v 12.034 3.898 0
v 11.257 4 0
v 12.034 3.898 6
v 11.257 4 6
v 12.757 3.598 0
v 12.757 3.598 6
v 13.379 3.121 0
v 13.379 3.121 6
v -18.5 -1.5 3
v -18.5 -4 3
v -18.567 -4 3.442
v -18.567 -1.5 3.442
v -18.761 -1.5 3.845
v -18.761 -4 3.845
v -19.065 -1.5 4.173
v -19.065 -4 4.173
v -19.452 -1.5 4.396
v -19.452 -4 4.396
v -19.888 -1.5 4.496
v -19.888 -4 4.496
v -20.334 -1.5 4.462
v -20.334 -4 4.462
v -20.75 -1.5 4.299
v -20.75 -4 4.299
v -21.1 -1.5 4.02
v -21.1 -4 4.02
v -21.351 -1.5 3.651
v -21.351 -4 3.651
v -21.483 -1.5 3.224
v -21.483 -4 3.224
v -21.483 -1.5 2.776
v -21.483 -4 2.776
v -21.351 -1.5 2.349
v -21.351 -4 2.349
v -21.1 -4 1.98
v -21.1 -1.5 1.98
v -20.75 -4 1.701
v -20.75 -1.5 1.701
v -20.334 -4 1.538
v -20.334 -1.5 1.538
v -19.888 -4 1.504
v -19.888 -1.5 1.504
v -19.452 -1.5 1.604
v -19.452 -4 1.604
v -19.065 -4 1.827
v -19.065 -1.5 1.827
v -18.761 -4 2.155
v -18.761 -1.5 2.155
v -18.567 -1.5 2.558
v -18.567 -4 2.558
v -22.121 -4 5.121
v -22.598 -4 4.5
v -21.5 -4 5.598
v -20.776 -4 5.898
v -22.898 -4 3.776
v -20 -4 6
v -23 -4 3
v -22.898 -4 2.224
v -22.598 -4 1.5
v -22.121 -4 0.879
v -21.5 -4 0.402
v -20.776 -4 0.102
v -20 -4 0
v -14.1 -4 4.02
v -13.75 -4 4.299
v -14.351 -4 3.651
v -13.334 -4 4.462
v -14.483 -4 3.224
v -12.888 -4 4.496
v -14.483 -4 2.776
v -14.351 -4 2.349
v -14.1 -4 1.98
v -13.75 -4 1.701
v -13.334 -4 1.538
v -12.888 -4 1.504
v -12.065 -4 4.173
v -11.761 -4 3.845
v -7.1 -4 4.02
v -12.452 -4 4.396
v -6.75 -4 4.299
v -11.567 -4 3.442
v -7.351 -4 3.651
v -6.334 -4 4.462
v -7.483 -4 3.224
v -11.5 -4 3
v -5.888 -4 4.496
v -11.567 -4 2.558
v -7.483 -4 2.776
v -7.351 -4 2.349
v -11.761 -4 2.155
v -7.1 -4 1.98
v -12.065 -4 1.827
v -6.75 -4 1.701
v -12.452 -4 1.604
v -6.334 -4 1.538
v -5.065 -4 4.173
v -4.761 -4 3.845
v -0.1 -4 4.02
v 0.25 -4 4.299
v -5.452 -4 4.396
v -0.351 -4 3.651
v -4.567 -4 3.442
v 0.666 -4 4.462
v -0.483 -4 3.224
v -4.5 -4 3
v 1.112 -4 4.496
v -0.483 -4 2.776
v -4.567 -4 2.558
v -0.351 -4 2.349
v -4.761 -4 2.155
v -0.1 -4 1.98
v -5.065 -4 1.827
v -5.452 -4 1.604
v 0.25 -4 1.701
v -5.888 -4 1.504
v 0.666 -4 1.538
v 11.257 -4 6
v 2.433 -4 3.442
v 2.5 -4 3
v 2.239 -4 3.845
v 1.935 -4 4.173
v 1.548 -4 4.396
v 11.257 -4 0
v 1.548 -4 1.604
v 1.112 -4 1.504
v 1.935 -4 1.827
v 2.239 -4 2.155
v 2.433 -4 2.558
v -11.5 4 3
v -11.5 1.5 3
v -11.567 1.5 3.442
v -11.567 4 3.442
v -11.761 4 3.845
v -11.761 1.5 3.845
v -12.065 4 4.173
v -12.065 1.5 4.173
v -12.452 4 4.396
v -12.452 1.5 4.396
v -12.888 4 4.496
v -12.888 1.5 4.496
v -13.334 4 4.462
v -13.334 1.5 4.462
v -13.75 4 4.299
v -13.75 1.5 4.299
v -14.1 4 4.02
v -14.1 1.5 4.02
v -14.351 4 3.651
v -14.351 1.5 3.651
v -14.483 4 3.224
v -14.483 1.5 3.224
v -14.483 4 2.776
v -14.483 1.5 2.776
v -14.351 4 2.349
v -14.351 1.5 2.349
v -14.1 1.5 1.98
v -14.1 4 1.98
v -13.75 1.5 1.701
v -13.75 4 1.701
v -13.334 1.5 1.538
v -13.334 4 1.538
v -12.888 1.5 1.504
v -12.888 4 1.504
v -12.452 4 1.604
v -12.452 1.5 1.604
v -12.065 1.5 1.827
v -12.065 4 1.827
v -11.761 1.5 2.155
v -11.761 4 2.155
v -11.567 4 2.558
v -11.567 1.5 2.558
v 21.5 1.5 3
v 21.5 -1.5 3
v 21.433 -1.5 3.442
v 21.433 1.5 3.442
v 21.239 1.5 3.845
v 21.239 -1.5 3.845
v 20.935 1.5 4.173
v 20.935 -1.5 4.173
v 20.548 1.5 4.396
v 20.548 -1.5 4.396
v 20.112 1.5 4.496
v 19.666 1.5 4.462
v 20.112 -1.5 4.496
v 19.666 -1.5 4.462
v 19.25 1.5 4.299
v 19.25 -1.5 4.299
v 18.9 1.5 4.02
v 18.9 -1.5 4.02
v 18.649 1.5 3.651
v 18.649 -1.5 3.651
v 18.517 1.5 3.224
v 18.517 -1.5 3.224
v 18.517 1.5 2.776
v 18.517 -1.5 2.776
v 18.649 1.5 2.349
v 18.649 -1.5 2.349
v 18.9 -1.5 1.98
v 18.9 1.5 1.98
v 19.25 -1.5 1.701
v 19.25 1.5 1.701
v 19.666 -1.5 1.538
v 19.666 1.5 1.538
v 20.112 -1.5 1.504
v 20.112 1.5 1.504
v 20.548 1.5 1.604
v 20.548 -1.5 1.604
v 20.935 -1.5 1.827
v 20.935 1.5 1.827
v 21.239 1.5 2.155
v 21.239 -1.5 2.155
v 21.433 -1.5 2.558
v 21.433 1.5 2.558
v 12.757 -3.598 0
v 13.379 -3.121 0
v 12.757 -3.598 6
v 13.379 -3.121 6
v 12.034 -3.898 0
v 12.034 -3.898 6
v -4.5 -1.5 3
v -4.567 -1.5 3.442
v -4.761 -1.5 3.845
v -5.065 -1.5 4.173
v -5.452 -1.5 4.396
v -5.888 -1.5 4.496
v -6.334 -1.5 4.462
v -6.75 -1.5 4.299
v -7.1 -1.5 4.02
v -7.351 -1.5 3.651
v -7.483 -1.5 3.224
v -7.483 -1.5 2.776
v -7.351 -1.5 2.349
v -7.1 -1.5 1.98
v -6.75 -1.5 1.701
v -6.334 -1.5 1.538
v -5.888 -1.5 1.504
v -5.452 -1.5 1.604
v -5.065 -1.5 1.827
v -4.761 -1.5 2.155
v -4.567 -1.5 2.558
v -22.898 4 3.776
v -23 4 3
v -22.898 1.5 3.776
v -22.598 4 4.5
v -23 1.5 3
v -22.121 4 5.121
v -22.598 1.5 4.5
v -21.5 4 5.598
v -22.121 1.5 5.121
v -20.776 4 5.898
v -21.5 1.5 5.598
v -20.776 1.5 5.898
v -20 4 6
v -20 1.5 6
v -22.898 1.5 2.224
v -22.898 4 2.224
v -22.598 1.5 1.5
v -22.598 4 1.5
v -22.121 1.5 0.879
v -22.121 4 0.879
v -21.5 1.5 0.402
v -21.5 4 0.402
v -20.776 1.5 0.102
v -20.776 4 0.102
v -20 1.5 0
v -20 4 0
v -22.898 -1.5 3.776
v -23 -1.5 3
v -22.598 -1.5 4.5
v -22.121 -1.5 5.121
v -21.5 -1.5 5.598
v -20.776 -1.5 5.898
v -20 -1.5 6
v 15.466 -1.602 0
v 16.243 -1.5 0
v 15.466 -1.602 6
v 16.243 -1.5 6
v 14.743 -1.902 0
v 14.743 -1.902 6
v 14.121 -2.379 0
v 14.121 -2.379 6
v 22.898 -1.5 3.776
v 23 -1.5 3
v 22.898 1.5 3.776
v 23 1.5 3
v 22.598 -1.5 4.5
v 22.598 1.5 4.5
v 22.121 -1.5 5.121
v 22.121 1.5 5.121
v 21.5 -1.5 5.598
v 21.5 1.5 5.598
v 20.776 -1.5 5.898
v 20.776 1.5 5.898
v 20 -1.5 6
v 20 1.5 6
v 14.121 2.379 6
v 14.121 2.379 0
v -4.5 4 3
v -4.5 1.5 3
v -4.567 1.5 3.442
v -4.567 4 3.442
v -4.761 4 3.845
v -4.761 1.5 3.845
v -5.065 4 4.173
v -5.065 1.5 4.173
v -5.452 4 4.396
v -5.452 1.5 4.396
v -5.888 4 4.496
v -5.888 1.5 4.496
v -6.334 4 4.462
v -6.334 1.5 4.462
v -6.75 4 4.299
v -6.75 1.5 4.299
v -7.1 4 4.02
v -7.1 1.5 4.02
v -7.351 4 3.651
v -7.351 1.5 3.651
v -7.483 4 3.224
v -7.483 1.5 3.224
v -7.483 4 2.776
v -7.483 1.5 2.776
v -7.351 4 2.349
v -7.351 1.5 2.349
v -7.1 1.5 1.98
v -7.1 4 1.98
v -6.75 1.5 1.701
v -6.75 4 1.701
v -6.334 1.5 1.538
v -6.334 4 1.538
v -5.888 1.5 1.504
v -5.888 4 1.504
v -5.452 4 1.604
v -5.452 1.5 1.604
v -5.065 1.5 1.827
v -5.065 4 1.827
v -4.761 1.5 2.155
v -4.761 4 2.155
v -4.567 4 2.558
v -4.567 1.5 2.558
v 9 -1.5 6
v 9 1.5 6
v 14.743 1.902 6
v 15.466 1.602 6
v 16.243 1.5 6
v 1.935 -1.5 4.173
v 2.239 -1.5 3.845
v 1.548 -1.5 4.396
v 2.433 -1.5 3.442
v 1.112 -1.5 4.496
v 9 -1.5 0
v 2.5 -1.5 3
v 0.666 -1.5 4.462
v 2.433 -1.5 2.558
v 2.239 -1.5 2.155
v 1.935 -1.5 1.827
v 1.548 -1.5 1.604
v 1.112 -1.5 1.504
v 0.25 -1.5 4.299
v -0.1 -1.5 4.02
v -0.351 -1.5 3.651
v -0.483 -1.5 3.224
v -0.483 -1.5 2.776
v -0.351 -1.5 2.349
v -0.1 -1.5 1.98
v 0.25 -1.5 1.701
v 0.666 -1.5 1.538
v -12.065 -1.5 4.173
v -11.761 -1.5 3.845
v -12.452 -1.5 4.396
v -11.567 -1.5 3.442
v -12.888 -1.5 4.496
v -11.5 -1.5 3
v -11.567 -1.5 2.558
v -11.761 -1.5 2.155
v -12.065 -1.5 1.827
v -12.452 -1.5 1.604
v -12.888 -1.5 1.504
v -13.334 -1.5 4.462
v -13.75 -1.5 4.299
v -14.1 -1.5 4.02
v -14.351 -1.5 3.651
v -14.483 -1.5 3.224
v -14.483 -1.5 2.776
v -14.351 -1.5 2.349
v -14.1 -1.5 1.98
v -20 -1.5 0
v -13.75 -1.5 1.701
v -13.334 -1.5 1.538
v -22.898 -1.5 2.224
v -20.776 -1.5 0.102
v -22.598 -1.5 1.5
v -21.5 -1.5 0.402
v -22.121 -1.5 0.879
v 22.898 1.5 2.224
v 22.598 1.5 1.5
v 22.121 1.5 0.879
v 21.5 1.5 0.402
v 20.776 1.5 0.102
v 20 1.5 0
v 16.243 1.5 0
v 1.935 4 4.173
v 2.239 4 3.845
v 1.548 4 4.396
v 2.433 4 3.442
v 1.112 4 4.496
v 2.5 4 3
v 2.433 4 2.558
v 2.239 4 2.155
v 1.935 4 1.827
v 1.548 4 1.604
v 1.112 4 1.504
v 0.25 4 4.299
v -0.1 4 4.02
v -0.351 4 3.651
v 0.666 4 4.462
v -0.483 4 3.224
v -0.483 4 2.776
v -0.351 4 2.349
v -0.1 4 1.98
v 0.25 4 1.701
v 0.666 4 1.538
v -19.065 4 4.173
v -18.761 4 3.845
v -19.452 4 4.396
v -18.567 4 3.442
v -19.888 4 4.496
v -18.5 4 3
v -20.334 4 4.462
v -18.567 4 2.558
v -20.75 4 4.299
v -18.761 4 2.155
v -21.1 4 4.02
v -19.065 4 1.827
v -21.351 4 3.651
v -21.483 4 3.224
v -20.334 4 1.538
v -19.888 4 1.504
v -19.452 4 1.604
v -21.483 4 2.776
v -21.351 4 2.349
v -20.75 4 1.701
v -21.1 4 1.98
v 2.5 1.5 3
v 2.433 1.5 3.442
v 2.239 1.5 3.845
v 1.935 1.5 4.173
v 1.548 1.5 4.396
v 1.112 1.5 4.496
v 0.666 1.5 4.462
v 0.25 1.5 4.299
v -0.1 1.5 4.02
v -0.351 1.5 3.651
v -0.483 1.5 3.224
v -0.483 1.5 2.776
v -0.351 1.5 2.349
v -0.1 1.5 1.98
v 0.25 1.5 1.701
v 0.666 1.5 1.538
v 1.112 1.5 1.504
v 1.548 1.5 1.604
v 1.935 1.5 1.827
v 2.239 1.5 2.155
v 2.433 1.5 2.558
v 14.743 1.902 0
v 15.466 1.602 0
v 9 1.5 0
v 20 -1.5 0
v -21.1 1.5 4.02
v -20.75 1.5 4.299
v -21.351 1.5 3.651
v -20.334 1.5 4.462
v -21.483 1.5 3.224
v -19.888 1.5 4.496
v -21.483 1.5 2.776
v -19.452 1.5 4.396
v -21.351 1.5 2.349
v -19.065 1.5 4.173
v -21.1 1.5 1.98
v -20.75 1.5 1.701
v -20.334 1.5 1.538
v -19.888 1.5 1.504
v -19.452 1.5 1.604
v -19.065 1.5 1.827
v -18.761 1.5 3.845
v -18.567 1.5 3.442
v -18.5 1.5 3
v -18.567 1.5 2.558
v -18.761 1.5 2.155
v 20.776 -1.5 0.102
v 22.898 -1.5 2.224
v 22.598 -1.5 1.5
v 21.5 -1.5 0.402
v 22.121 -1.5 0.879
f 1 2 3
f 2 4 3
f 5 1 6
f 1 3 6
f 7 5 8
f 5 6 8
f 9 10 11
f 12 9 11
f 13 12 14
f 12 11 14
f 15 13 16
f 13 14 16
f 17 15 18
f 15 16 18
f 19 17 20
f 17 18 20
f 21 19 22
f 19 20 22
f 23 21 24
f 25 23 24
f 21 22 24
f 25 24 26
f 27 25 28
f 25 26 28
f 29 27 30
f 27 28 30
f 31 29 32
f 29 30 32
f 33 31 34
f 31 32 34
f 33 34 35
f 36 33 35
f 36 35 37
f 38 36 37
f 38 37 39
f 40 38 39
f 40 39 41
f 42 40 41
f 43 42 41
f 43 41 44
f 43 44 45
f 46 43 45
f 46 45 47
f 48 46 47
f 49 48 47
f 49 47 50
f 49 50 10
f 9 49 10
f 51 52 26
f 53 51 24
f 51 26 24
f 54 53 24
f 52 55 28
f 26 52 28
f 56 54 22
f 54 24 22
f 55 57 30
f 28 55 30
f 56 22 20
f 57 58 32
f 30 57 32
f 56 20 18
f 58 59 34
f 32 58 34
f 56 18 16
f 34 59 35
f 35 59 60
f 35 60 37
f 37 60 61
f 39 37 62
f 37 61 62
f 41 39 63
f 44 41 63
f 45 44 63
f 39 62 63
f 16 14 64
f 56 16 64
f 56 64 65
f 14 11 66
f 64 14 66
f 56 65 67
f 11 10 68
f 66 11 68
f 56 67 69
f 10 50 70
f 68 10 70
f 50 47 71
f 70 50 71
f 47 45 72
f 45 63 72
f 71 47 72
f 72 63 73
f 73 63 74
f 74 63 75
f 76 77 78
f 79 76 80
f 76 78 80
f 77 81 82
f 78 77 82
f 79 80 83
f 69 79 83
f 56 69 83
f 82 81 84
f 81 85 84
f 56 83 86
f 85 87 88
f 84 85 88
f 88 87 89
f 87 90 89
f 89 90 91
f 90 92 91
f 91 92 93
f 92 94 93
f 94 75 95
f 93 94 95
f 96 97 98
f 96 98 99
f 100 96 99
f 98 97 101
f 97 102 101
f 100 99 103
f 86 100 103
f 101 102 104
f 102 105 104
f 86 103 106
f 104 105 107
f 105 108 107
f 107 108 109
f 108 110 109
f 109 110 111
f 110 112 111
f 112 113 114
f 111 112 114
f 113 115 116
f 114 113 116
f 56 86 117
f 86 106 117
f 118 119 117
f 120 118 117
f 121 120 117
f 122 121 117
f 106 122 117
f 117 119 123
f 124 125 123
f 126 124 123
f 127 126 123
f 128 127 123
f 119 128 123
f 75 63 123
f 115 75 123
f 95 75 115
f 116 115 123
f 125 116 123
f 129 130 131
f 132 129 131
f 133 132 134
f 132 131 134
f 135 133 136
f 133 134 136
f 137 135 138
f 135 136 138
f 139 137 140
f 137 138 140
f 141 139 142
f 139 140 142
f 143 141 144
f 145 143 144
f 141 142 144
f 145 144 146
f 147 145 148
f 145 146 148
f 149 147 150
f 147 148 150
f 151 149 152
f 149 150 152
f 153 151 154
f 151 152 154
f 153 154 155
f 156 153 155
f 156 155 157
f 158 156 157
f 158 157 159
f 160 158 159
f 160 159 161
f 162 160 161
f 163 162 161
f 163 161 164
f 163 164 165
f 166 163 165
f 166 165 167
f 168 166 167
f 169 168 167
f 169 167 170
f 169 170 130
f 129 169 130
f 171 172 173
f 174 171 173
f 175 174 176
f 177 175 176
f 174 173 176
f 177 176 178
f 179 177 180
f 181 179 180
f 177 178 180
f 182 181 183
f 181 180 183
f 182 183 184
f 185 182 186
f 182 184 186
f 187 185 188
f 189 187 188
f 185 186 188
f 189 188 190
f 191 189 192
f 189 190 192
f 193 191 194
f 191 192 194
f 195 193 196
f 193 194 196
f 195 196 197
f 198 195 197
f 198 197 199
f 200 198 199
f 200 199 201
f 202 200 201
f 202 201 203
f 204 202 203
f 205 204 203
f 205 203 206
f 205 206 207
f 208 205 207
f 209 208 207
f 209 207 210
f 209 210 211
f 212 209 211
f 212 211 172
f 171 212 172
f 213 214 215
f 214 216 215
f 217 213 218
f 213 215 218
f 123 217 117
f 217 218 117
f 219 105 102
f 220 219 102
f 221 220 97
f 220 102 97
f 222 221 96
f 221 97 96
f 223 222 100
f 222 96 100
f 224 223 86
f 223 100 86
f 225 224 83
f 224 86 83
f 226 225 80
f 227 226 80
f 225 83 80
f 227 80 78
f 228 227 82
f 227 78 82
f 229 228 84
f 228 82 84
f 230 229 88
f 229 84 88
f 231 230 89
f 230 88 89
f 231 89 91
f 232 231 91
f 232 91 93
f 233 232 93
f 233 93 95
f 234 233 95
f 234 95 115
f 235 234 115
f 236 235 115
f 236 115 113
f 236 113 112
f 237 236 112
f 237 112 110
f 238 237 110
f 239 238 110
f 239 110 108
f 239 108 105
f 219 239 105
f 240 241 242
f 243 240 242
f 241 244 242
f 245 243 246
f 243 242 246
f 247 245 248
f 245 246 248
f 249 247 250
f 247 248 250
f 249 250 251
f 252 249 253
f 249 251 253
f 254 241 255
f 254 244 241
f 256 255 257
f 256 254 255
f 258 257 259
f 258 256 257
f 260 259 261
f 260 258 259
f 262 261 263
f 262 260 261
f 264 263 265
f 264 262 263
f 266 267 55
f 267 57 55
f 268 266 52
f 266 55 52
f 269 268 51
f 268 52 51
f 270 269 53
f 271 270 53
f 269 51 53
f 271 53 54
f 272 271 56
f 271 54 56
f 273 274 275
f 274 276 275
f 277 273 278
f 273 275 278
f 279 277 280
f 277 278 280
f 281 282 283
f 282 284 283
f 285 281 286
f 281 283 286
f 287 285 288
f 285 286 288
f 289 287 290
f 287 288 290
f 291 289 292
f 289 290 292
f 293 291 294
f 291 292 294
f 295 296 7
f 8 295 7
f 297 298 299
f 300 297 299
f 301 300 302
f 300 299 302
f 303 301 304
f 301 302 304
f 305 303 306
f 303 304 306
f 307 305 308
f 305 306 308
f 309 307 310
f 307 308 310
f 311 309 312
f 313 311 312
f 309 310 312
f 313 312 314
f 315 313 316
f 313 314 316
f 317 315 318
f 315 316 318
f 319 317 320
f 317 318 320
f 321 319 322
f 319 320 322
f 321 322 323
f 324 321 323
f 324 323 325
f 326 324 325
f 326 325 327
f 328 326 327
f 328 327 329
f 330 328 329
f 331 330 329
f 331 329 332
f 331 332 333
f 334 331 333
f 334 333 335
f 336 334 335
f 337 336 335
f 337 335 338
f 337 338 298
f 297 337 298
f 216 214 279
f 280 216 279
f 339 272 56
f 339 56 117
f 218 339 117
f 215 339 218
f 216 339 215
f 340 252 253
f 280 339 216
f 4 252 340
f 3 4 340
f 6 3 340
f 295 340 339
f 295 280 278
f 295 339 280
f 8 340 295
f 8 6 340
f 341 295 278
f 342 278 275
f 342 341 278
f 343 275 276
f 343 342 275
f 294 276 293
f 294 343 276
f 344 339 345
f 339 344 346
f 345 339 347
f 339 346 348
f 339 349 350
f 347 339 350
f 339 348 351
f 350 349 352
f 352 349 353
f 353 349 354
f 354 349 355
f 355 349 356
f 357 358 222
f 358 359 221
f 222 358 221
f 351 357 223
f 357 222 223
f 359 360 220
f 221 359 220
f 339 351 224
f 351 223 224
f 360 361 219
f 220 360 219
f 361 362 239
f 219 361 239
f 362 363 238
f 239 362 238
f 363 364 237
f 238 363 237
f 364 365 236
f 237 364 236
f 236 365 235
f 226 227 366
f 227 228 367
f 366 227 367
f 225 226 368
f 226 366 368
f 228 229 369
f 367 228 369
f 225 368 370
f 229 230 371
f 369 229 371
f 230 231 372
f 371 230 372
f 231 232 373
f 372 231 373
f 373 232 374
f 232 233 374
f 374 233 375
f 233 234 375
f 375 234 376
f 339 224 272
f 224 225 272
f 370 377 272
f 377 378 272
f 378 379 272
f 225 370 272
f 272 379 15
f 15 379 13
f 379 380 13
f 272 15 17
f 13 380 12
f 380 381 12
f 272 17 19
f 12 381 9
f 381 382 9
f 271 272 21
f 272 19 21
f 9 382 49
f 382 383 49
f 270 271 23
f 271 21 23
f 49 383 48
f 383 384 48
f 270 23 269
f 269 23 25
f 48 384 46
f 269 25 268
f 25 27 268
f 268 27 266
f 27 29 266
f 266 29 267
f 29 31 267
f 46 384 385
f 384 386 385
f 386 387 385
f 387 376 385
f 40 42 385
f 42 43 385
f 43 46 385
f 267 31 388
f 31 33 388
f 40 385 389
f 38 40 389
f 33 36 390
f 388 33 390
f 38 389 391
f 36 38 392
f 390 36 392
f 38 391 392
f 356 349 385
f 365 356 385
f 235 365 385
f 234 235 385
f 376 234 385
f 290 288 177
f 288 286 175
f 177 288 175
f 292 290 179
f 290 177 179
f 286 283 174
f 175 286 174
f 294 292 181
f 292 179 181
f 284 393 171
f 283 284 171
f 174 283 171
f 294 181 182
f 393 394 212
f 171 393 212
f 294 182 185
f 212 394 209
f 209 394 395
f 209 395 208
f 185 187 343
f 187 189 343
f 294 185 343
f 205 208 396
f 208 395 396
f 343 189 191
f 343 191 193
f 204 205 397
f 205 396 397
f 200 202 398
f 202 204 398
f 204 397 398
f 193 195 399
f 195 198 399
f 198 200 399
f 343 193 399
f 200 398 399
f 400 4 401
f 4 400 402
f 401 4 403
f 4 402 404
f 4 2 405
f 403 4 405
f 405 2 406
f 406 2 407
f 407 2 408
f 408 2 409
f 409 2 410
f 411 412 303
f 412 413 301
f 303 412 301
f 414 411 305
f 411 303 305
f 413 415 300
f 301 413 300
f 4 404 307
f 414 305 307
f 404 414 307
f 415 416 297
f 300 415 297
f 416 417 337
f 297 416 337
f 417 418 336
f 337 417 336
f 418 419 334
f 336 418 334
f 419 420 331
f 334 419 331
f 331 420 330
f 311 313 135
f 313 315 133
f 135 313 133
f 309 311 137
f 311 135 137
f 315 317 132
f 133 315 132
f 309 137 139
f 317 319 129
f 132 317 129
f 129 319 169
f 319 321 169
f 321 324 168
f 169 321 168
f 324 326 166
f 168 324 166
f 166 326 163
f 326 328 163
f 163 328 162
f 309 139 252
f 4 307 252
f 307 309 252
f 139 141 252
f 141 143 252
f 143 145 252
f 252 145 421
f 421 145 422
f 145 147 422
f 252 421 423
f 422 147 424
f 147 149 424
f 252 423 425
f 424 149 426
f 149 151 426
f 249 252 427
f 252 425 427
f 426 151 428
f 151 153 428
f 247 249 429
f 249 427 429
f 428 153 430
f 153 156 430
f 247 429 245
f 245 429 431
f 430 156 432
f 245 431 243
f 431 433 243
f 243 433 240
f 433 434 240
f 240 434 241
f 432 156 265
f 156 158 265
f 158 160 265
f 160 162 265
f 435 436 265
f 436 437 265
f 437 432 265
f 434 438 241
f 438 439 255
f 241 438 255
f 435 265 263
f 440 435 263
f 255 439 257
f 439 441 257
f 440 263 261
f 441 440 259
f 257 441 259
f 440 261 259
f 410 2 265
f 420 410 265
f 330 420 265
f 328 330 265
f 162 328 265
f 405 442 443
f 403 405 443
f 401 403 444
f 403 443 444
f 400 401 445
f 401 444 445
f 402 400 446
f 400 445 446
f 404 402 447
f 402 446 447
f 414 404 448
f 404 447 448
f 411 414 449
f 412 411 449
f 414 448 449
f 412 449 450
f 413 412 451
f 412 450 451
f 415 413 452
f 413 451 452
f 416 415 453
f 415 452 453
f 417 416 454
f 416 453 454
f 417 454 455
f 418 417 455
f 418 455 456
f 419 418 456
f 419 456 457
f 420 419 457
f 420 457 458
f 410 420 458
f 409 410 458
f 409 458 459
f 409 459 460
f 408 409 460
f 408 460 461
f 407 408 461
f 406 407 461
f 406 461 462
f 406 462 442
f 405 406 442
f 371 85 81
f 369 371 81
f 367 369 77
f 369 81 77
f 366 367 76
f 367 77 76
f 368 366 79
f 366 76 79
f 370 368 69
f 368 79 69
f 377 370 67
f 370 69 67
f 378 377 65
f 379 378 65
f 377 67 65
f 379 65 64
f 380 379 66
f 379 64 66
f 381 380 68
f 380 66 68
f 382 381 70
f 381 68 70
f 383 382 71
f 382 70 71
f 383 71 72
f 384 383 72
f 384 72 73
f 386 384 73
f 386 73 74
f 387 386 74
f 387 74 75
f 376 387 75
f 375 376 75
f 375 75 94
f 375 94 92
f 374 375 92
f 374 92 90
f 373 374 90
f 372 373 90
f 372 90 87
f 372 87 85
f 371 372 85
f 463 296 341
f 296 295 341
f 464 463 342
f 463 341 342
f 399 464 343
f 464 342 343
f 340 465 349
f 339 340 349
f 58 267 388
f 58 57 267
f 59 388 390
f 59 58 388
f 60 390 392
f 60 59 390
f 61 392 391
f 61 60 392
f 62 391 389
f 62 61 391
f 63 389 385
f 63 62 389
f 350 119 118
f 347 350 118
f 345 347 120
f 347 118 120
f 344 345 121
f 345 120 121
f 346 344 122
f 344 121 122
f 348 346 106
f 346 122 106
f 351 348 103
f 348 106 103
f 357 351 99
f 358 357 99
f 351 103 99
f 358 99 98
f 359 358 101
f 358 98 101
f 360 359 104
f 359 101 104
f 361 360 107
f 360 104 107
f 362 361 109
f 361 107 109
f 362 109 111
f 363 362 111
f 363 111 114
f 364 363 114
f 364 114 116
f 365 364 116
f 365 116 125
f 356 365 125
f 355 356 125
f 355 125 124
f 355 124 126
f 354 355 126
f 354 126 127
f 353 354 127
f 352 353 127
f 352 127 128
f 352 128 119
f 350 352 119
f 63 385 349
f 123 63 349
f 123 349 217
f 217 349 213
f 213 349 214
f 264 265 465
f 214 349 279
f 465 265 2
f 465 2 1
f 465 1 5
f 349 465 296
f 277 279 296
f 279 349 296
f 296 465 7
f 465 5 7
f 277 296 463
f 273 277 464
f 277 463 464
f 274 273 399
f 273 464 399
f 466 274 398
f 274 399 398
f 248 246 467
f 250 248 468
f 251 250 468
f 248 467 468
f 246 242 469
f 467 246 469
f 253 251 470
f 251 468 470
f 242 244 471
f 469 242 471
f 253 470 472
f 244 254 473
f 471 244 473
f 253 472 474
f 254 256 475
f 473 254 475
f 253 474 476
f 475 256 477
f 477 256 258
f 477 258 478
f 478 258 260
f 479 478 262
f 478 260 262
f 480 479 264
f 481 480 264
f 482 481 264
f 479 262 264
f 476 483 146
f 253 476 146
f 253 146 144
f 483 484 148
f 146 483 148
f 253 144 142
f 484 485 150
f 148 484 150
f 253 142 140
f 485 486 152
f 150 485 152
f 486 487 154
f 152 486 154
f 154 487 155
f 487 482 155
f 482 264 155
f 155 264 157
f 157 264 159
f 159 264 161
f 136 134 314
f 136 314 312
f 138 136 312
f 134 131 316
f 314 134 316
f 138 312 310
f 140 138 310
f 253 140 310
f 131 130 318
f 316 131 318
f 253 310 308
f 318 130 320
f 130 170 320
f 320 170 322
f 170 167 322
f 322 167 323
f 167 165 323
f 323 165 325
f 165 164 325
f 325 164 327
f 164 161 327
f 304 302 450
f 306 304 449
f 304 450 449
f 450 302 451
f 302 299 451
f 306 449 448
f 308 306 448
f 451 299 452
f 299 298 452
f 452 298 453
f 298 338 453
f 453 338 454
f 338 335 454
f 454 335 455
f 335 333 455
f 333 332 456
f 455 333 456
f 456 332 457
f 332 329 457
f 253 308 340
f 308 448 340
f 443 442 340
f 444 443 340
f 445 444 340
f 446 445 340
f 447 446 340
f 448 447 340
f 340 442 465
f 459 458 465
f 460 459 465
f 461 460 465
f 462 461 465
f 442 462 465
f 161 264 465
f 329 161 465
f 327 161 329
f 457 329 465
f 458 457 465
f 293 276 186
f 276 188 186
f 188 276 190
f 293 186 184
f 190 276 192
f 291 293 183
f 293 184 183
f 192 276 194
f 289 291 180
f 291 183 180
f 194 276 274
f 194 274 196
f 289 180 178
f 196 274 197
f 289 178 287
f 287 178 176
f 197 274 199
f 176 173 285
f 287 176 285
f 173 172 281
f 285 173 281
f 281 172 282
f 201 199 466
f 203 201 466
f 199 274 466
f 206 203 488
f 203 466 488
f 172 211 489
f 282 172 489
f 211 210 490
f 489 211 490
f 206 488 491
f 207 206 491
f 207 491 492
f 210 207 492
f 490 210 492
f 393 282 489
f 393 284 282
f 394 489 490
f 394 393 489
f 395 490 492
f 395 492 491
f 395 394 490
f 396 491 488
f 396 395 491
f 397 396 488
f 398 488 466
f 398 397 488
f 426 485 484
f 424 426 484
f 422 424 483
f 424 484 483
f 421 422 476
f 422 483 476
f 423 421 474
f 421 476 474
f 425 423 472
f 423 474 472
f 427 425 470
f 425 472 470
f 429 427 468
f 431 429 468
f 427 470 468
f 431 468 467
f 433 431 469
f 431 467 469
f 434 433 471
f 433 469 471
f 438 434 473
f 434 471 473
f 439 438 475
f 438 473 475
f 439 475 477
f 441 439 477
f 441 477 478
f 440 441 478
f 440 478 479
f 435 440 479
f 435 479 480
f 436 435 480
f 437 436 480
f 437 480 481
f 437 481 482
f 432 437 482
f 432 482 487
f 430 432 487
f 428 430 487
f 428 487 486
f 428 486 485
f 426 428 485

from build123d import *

# Parameters (mm, degrees)
F1_DEPTH = 6
F2_R     = 2.99999
F3_R     = 3
F4_R     = 1.5
F5_R     = 1.5
F6_DEPTH = 25


# Not quite as in the source:
# - a fillet or chamfer is up to 0.001 mm smaller than in the source, because OpenCascade refuses the exact size


with BuildPart() as f1:
    # F0 (on Top) → F1 (new body)
    with BuildSketch(Plane.XY):
        Polygon((15, 1.5), (12.5, 4), (-23, 4), (-23, 1.5), (9, 1.5), (9, -1.5), (-23, -1.5), (-23, -4), (12.5, -4), (15, -1.5), (23, -1.5), (23, 1.5), align=None)
    extrude(amount=F1_DEPTH)

    # F2 (radius 3 in the source; OpenCascade refuses exactly that, so slightly less here)
    f2_edges = [f1.edges().sort_by_distance(p)[0] for p in [
        (-23, -2.75, 6),
        (-23, 2.75, 6),
        (23, 0, 6),
        (23, 0, 0),
        (-23, 2.75, 0),
        (-23, -2.75, 0),
    ]]
    fillet(f2_edges, radius=F2_R)

    # F3
    f3_edges = [f1.edges().sort_by_distance(p)[0] for p in [
        (12.5, 4, 3),
        (15, 1.5, 3),
        (15, -1.5, 3),
        (12.5, -4, 3),
    ]]
    fillet(f3_edges, radius=F3_R)

    # F4 (on face) + F5 (on face) → F6 (cut)
    with BuildSketch(Plane.XZ.offset(4)):
        with Locations((-20, 3)):
            Circle(F4_R)
        with Locations((-13, 3)):
            Circle(F4_R)
        with Locations((-6, 3)):
            Circle(F4_R)
        with Locations((1, 3)):
            Circle(F4_R)
    with BuildSketch(Plane.XZ.offset(1.5)):
        with Locations((20, 3)):
            Circle(F5_R)
    extrude(amount=-F6_DEPTH, mode=Mode.SUBTRACT)


solid = f1.part
